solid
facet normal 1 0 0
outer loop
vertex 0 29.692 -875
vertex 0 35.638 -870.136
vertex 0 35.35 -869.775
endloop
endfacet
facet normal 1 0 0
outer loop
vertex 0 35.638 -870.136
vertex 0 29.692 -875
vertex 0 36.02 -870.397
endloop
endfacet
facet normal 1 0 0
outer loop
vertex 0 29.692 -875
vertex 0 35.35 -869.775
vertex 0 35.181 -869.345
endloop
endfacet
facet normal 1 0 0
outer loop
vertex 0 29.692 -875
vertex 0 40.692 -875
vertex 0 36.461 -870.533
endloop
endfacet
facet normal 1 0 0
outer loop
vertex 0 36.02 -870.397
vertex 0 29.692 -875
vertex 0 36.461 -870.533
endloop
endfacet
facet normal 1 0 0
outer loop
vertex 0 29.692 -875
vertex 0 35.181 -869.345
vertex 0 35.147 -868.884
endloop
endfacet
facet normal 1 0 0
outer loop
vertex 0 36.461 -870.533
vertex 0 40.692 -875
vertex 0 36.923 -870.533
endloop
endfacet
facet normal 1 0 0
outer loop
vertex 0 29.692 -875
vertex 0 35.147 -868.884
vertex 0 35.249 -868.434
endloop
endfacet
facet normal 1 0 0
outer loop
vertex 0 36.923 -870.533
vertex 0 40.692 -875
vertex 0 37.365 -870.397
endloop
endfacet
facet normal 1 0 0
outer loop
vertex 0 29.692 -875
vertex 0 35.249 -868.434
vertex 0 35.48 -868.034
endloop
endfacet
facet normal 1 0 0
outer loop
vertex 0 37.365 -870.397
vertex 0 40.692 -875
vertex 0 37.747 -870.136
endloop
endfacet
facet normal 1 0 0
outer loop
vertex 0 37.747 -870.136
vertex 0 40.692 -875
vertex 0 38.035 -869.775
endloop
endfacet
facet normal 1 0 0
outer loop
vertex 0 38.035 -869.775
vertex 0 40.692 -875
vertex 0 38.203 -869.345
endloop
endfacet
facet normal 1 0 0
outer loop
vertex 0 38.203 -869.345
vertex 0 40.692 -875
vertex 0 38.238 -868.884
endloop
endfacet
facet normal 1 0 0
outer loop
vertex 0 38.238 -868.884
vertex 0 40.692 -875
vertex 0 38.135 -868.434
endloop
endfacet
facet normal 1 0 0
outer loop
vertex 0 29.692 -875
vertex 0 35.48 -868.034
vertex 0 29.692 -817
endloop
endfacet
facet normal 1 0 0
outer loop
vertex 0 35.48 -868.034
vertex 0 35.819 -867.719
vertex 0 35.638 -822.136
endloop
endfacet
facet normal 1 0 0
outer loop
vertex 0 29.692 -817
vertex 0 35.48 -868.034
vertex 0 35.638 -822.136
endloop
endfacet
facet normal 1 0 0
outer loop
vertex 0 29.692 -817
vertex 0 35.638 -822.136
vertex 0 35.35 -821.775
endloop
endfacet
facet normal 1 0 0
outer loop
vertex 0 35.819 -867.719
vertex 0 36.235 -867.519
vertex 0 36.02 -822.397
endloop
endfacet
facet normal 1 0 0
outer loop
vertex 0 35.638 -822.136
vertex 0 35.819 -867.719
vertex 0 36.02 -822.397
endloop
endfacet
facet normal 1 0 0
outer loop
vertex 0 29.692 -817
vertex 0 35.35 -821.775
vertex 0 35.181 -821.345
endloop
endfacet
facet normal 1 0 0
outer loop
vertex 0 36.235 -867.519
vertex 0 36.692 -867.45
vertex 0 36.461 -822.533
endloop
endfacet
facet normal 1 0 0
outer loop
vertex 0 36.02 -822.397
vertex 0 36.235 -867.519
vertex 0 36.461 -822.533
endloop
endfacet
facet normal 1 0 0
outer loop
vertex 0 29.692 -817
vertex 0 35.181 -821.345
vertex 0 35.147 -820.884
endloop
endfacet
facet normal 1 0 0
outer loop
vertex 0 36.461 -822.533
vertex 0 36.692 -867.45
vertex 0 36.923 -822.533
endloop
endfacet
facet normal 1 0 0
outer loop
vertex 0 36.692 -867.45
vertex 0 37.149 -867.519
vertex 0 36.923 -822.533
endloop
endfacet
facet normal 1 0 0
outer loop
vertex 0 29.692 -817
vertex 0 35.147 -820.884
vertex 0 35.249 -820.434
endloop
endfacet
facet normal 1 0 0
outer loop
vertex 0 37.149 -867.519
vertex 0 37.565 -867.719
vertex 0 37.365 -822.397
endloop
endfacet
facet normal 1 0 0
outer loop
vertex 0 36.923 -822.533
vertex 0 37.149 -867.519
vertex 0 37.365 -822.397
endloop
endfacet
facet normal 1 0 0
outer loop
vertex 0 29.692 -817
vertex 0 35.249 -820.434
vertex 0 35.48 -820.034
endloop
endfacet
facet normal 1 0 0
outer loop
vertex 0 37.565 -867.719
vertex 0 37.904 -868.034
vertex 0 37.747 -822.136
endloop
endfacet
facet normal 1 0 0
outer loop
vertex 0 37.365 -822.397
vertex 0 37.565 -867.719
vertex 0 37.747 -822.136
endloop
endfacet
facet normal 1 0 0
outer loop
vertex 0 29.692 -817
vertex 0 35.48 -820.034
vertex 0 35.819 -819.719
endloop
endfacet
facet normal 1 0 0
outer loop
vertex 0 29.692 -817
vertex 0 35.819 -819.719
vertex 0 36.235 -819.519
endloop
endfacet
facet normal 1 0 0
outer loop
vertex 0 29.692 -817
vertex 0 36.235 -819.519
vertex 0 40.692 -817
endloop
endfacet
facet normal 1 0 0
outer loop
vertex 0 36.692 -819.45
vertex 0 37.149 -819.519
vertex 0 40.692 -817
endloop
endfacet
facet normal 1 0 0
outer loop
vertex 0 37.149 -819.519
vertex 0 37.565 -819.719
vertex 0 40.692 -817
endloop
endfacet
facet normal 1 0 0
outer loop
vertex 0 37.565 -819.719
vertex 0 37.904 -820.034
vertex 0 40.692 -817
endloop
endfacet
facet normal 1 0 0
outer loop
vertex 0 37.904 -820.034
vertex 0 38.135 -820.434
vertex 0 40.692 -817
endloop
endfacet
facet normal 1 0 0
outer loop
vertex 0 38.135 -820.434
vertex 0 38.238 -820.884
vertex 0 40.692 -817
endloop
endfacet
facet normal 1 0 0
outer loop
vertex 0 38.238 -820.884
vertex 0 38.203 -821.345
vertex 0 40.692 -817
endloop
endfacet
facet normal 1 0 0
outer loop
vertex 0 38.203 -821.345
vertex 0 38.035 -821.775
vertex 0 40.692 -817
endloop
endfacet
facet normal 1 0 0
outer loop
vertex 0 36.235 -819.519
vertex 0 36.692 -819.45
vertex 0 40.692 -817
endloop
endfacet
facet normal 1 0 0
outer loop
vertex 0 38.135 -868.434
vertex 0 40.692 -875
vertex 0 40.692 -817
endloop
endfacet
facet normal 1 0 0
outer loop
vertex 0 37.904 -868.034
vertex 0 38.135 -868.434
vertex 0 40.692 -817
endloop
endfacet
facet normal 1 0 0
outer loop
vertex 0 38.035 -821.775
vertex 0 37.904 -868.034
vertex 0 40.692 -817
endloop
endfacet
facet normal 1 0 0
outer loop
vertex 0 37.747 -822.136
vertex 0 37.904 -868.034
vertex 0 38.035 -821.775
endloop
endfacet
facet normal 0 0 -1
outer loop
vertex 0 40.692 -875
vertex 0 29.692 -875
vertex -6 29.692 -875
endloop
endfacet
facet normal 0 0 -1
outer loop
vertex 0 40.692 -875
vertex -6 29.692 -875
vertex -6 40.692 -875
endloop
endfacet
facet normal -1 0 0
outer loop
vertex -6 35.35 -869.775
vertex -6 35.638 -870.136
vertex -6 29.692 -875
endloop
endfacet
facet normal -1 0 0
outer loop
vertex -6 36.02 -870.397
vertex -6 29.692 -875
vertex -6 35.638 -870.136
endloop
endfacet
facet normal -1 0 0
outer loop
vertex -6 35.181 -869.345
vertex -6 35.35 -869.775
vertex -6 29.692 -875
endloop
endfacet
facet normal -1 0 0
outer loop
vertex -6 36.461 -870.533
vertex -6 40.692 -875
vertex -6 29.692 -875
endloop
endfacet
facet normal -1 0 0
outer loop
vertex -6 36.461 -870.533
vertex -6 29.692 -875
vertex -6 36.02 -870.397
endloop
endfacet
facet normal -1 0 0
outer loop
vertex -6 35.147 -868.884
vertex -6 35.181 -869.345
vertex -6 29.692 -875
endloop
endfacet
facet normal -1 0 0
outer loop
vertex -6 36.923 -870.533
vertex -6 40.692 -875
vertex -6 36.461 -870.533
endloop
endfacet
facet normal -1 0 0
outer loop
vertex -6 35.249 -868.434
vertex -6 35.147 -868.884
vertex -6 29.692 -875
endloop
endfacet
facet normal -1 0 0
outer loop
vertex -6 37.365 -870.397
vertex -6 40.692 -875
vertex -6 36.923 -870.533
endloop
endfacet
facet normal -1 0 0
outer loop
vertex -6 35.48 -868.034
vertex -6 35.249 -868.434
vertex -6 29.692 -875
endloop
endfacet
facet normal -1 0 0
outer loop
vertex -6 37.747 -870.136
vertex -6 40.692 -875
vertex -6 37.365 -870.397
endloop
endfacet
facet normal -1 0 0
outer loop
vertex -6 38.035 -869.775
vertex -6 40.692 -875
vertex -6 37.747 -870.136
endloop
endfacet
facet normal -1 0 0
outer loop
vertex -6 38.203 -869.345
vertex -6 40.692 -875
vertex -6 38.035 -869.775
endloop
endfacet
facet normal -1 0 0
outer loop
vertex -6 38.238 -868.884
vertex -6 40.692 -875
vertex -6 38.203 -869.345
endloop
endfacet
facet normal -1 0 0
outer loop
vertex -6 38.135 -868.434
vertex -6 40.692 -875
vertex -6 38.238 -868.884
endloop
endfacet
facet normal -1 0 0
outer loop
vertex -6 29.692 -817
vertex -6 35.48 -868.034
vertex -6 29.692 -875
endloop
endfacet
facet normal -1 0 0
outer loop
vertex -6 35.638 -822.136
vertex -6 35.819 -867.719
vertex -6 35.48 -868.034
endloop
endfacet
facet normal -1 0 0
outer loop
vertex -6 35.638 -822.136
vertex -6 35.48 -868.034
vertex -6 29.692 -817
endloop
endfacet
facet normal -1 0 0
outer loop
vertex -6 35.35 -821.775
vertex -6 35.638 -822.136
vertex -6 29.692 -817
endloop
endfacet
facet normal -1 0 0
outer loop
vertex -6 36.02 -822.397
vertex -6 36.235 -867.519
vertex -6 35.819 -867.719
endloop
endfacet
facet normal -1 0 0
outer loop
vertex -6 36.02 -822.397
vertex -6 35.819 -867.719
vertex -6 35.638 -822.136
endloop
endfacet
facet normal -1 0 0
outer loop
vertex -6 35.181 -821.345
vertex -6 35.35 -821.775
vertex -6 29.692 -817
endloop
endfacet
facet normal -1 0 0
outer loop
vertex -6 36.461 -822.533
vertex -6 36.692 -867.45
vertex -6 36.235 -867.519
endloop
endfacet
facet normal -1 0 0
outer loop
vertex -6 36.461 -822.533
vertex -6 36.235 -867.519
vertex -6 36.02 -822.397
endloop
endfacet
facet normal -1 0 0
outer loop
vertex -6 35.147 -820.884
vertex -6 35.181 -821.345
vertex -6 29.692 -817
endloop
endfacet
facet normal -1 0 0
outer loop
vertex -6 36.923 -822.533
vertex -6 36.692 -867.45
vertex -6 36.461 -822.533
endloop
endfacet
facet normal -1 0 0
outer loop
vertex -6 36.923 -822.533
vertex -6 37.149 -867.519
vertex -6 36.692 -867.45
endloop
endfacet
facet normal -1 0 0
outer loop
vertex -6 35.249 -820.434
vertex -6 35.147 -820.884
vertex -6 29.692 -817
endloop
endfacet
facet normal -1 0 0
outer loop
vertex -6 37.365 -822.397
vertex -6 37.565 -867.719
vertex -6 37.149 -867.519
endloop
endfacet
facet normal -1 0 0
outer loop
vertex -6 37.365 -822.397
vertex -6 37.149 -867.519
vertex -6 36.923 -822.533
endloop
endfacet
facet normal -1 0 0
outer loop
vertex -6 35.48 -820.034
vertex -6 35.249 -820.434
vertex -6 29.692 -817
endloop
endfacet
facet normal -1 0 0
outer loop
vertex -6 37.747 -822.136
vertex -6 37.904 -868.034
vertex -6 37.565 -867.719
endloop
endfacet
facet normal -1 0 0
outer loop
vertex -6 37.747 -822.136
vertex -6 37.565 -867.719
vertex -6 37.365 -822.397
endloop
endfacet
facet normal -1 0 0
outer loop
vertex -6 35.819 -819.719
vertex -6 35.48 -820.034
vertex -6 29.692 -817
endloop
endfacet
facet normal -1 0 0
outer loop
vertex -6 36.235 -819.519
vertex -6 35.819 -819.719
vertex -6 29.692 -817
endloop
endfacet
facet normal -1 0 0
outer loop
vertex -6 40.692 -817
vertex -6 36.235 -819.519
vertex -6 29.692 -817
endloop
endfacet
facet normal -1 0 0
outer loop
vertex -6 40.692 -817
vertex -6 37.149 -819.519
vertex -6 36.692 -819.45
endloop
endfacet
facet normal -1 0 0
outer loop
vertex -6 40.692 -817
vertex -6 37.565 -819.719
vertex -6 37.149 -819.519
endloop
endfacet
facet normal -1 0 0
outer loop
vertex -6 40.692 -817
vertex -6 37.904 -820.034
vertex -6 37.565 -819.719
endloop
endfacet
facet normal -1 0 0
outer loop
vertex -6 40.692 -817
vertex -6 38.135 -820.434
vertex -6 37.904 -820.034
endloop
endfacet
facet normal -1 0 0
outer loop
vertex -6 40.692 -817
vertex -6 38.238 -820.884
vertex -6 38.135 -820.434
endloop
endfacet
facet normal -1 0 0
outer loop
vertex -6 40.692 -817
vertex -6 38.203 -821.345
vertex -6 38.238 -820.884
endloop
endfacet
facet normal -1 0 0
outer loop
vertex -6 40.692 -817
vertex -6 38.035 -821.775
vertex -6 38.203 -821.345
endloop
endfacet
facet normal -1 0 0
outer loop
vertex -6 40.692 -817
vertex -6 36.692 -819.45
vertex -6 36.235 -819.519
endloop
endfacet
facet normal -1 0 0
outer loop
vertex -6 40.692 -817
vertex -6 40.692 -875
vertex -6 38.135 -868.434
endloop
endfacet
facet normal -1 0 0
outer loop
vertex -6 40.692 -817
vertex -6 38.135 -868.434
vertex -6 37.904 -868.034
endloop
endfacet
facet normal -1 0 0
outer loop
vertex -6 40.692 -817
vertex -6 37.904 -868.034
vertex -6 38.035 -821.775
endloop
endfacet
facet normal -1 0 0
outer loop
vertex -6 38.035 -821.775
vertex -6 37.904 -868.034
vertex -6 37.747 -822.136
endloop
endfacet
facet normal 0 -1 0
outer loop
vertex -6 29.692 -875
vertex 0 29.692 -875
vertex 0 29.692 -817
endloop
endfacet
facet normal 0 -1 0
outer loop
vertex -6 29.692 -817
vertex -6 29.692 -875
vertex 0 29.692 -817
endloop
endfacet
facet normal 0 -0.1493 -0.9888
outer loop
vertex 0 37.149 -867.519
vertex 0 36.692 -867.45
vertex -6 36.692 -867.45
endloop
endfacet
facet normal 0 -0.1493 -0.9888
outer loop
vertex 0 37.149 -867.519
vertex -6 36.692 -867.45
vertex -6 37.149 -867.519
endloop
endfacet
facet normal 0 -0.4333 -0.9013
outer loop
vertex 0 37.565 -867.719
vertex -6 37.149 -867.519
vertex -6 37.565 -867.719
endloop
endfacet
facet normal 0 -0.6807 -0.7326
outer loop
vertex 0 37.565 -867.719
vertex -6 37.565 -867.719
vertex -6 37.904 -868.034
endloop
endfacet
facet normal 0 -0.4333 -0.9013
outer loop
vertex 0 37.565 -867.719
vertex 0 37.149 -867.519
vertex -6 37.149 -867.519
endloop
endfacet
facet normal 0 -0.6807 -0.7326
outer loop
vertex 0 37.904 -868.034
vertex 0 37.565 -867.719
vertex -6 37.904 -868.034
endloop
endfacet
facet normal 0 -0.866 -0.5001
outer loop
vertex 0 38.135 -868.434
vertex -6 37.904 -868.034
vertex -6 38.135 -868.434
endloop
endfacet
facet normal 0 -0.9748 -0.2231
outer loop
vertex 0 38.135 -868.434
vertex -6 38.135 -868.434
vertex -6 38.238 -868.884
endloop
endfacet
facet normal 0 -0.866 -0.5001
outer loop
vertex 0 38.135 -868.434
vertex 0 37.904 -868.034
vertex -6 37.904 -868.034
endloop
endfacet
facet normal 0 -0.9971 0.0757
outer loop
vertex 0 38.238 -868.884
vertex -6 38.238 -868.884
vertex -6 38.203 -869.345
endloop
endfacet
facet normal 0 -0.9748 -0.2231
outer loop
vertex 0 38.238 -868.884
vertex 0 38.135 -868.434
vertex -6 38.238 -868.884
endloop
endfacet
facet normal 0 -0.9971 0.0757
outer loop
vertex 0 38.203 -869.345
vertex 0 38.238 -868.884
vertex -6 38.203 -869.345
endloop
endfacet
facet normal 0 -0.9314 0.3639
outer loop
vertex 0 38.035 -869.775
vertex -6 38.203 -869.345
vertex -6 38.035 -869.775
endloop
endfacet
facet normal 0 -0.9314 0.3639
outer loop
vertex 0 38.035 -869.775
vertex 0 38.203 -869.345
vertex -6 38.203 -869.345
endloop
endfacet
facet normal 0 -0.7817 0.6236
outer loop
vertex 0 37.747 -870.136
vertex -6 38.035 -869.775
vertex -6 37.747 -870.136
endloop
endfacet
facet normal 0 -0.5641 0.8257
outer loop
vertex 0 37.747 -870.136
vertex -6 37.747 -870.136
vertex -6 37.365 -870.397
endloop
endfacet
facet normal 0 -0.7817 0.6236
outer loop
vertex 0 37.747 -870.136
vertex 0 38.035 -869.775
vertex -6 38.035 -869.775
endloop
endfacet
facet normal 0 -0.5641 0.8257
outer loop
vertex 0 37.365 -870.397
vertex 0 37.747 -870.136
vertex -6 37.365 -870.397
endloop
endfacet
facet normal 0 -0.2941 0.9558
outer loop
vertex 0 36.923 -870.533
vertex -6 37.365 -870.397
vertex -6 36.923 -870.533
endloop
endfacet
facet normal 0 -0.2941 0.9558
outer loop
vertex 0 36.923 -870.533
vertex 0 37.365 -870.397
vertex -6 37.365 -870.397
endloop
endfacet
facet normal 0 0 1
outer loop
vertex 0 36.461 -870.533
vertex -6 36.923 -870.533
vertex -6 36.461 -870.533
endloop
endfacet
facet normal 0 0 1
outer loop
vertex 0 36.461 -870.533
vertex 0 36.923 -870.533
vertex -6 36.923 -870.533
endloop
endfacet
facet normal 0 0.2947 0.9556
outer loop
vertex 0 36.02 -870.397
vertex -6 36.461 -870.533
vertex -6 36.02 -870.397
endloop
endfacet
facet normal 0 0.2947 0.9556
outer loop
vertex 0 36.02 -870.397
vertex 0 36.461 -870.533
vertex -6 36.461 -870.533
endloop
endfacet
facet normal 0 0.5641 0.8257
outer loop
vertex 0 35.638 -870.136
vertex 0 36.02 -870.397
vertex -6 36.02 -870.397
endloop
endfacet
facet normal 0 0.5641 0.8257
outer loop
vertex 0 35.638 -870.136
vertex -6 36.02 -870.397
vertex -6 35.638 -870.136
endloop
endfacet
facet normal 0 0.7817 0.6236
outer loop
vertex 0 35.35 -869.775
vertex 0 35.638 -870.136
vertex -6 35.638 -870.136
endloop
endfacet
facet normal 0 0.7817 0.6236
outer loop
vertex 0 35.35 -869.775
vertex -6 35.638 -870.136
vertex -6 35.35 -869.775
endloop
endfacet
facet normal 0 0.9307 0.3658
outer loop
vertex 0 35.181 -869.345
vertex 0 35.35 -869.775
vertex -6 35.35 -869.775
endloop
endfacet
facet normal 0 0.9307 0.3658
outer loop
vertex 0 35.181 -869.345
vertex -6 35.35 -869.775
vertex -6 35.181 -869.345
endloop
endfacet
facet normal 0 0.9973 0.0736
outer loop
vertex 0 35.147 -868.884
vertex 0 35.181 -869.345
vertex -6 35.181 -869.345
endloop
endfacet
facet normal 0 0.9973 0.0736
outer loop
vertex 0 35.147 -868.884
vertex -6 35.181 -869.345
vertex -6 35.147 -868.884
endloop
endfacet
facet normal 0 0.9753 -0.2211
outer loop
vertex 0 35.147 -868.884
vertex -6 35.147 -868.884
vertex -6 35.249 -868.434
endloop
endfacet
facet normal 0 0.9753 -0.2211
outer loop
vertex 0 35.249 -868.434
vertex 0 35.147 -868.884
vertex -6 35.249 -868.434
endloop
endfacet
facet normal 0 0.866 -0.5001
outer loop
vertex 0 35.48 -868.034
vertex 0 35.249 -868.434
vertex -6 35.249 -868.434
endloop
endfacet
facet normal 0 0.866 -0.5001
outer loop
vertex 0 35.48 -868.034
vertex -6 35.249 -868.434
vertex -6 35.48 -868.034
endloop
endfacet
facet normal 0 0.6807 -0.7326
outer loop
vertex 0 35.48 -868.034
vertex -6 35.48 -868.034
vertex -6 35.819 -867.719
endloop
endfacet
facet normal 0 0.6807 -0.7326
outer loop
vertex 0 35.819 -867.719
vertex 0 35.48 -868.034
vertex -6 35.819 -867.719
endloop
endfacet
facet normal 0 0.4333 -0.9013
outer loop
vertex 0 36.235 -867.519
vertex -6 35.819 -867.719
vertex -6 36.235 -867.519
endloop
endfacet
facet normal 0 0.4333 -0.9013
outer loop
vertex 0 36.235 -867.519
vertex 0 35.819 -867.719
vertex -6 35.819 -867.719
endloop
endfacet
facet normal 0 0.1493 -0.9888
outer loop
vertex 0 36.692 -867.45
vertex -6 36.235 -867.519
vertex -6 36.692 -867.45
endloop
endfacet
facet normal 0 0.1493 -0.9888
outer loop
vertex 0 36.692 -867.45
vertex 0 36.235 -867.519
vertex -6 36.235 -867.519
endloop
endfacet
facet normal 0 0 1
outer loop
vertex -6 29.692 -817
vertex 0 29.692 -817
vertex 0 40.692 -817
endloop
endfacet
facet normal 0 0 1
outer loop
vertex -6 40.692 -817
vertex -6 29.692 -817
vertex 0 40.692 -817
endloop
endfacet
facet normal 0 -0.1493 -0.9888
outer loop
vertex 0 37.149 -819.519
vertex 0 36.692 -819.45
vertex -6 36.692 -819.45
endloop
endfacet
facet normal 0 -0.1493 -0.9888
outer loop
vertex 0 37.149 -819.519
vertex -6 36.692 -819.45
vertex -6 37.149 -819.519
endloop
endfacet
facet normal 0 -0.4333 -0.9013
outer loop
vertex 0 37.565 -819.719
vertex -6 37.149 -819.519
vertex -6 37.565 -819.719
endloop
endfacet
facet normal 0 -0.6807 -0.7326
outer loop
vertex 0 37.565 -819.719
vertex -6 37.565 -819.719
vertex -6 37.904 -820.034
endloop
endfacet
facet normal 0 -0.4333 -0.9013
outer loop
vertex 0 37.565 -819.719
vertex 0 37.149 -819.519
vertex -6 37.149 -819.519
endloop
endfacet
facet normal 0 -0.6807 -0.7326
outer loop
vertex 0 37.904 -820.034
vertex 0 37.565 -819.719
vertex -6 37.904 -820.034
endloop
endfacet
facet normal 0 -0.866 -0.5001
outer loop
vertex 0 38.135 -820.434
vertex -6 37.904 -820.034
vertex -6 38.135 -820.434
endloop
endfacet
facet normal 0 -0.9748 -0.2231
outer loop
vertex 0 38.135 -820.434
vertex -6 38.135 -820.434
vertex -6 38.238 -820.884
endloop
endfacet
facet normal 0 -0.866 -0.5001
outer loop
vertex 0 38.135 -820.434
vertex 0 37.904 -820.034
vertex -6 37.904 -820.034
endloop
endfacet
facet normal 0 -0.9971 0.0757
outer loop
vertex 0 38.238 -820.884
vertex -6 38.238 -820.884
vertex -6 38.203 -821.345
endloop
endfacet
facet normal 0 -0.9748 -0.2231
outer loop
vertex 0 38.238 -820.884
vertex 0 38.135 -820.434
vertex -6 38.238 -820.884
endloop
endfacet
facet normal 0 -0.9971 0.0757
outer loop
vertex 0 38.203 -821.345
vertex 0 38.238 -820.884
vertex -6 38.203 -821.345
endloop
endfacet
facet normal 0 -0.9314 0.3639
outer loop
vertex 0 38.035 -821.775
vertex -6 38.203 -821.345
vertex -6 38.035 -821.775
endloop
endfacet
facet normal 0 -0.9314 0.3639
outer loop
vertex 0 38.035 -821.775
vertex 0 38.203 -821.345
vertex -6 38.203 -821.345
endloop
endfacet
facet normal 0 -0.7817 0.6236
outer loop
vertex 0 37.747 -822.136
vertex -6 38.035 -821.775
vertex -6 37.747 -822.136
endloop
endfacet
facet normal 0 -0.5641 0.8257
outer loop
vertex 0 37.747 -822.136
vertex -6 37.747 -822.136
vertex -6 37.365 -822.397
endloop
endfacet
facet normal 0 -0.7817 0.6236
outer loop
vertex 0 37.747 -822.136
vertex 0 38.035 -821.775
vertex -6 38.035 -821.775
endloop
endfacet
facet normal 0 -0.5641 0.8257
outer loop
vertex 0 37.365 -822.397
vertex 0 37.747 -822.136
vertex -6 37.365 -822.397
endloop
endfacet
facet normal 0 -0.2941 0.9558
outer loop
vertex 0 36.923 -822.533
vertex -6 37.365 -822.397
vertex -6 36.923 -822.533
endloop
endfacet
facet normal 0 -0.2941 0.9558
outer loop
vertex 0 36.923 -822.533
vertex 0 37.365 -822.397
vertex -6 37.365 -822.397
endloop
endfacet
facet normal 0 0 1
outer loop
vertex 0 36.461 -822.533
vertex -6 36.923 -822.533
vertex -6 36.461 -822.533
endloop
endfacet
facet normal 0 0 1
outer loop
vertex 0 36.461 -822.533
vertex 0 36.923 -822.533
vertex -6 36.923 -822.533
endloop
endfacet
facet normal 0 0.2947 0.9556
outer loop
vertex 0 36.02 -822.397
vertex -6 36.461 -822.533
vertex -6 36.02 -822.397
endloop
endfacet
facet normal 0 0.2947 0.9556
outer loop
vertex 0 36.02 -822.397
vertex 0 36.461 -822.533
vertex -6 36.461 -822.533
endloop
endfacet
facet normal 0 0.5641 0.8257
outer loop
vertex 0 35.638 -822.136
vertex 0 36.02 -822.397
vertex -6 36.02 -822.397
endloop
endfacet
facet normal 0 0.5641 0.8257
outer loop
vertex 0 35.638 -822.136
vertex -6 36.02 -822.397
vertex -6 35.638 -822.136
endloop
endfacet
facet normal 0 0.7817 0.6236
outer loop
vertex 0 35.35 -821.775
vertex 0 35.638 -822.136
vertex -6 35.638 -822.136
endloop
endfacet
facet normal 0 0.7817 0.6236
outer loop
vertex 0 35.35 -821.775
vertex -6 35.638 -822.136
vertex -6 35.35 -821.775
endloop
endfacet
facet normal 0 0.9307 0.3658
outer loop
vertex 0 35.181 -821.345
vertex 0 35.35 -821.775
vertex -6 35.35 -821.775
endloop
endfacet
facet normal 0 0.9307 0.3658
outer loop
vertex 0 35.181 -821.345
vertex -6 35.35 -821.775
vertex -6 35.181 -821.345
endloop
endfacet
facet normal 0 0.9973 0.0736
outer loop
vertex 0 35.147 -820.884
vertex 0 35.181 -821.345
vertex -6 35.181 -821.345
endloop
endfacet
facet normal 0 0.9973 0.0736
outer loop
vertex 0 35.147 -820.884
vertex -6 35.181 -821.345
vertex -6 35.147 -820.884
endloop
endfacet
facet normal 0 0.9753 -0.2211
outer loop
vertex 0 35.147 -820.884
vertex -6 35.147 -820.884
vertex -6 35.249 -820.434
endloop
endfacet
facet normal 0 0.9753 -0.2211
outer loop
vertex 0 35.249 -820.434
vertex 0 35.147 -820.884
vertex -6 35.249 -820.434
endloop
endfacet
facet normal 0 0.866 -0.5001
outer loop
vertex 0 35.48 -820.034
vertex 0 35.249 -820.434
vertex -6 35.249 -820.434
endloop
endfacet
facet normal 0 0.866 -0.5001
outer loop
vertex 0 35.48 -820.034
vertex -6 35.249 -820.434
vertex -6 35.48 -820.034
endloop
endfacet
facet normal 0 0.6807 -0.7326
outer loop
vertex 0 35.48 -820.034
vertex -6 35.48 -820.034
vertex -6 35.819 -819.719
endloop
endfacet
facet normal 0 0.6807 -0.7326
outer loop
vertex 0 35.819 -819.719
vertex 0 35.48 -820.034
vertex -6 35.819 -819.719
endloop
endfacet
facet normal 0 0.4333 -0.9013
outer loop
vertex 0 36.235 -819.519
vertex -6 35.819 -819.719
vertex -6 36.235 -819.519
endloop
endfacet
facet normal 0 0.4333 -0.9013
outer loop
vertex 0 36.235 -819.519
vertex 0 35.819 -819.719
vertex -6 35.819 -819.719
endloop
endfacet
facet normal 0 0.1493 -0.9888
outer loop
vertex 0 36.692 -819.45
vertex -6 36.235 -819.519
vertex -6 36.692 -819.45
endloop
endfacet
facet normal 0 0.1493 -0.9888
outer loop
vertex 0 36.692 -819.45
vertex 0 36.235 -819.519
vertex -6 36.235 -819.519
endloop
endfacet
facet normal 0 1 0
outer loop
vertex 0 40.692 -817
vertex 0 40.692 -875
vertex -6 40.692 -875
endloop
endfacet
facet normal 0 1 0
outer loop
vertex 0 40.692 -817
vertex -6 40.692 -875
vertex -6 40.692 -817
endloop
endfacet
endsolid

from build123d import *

# Parameters (mm, degrees)
SZKIC1_W                    = 58
SZKIC1_H                    = 11
SZKIC1_R                    = 1.55
DODANIE_WYCI_GNI_CIE1_DEPTH = 6


with BuildPart() as part:
    # Szkic1 → Dodanie-wyciągnięcie1 (new body)
    with BuildSketch(Plane.ZY):
        with Locations((-846, 35.19227062)):
            Rectangle(SZKIC1_W, SZKIC1_H)
        with Locations((-869, 36.69227062)):
            Circle(SZKIC1_R, mode=Mode.SUBTRACT)
        with Locations((-821, 36.69227062)):
            Circle(SZKIC1_R, mode=Mode.SUBTRACT)
    extrude(amount=DODANIE_WYCI_GNI_CIE1_DEPTH)


solid = part.part
